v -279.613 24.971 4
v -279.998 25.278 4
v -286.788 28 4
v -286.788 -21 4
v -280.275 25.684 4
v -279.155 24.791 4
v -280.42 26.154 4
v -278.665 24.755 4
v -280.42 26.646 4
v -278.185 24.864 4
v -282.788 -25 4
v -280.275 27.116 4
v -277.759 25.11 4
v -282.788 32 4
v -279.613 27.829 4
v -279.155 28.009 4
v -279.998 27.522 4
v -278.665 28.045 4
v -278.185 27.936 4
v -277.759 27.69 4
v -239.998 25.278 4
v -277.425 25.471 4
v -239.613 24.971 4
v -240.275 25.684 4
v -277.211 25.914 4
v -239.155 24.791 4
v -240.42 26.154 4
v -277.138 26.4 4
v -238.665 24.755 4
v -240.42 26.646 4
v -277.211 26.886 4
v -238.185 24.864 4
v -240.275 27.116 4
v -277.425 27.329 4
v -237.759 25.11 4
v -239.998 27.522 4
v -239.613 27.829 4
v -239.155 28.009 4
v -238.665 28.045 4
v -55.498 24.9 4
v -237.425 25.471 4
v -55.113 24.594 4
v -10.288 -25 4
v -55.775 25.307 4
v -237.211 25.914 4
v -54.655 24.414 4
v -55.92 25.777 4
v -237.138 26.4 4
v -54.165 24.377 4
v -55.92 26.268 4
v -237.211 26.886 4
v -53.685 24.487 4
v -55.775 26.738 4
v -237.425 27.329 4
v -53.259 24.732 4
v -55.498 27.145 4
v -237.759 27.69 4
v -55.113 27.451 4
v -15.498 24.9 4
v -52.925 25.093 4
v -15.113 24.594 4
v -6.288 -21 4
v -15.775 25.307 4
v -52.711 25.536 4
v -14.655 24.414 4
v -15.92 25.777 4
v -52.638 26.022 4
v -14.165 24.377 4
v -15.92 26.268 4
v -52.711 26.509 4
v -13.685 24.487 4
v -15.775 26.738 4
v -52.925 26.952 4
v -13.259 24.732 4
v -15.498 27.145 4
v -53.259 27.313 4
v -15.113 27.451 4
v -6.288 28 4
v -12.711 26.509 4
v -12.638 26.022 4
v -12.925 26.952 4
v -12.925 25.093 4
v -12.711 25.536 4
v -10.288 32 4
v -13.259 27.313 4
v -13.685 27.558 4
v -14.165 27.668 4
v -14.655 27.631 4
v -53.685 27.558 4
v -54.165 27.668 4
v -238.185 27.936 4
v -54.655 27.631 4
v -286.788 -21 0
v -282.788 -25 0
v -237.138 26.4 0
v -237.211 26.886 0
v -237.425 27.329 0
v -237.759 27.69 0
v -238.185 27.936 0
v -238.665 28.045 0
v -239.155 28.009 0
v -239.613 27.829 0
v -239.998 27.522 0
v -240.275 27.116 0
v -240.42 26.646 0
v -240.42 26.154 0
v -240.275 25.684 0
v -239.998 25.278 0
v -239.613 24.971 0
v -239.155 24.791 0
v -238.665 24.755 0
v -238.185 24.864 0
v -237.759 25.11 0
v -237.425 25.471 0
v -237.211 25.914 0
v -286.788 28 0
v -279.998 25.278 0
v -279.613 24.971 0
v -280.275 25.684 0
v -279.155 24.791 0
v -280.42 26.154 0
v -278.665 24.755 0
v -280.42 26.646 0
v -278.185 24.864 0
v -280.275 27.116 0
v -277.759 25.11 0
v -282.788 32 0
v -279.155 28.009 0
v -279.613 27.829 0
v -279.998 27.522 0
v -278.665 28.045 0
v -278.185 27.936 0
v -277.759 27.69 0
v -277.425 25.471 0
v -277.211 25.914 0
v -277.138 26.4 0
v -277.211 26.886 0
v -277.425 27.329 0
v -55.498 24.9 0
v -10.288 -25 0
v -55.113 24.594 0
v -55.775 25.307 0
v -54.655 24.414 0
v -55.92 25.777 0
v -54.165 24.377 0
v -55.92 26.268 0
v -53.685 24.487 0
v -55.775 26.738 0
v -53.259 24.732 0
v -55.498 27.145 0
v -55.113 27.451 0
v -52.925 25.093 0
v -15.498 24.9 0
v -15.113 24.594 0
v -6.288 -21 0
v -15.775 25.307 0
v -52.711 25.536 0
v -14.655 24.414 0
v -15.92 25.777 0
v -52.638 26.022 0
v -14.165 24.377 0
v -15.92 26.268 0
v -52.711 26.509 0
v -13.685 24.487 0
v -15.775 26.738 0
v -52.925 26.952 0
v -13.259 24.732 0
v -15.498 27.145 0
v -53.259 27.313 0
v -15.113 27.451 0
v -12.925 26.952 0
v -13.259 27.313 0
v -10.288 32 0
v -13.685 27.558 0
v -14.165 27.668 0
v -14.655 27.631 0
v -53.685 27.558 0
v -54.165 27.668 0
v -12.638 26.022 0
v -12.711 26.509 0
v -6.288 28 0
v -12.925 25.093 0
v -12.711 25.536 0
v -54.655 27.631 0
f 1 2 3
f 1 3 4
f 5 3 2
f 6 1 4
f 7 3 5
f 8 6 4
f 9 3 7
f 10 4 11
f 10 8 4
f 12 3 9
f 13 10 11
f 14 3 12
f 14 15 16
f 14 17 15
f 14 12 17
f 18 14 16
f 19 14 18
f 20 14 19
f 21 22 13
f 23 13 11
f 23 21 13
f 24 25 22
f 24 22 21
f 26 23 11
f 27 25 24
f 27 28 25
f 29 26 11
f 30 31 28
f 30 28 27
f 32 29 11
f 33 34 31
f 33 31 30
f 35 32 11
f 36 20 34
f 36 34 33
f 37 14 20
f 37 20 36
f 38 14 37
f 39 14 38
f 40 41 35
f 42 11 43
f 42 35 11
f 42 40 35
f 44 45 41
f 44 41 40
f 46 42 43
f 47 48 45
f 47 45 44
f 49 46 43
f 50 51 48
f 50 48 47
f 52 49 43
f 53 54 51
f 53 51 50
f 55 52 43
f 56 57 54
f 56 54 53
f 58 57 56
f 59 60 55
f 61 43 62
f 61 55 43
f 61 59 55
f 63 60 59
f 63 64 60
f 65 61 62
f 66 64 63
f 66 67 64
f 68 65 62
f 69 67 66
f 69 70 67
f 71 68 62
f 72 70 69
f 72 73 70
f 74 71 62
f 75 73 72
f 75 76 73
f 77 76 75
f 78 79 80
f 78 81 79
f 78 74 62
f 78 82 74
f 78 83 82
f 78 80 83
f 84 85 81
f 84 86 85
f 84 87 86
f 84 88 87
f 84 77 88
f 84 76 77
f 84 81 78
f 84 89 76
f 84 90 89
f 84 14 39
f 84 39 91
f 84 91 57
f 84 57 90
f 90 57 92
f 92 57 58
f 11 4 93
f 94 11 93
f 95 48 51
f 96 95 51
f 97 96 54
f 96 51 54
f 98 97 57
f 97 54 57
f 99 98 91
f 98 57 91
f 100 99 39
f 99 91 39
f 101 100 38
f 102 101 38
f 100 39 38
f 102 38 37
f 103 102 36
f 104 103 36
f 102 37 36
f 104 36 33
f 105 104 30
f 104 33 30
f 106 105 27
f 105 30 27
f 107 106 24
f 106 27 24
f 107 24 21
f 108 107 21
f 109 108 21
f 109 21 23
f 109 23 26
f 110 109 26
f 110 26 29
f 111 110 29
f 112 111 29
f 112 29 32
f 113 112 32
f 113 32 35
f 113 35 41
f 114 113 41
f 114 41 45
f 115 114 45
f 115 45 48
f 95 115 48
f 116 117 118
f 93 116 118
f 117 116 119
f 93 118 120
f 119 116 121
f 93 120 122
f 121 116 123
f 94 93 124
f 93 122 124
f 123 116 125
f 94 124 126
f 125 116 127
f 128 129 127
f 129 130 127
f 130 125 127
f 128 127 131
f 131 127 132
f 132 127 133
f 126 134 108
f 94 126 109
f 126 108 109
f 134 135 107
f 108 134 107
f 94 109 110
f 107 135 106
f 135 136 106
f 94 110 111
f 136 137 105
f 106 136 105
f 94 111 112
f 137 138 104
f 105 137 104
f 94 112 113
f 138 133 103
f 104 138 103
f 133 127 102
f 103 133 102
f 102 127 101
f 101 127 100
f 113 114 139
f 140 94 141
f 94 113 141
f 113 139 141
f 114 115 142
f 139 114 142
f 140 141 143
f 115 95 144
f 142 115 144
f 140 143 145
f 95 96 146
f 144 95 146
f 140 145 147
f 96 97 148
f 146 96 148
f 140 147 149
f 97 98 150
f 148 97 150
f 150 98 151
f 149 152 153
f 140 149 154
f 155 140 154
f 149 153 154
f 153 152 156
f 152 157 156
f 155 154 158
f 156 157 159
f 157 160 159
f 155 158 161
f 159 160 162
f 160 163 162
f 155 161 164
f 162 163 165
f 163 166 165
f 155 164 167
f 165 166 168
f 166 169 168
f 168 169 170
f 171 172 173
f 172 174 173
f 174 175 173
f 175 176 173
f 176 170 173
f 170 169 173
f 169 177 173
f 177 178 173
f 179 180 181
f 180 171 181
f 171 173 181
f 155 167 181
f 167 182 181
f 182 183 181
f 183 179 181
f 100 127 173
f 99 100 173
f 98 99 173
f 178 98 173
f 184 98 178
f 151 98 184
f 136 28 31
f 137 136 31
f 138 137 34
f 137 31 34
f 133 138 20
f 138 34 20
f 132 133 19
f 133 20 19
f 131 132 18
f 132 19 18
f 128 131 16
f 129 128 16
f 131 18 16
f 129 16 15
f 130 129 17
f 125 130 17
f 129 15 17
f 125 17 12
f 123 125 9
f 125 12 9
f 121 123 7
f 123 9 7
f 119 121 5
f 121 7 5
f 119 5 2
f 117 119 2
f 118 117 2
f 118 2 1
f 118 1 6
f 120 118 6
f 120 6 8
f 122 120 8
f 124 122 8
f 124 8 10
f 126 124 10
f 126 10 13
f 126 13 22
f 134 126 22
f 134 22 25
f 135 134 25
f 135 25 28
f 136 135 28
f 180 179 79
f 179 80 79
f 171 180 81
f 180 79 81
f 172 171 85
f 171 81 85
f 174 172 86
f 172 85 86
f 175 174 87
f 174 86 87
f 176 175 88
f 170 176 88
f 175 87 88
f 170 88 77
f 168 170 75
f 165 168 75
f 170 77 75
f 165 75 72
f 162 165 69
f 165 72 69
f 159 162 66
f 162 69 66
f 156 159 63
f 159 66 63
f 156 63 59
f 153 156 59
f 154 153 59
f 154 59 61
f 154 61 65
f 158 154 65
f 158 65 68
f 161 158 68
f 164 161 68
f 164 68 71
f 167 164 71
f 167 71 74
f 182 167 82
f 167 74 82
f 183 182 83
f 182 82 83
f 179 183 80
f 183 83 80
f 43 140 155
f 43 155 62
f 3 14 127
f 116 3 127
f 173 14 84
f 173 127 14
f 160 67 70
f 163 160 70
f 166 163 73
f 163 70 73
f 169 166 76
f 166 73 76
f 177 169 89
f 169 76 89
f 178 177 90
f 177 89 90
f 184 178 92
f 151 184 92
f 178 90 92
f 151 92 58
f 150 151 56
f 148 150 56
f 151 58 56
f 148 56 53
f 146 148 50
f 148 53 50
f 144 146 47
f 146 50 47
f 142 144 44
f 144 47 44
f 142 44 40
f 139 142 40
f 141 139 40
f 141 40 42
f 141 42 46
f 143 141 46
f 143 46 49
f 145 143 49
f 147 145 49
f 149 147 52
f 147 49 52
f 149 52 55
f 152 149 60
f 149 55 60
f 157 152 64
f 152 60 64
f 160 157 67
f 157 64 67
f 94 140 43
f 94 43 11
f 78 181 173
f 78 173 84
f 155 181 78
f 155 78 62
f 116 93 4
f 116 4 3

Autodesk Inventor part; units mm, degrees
ref_plane "YZ Plane" through (0, 0, 0) normal (1, 0, 0) x (0, 1, 0)
ref_plane "XZ Plane" through (0, 0, 0) normal (0, 1, 0) x (-1, 0, 0)
ref_plane "XY Plane" through (0, 0, 0) normal (0, 0, 1) x (1, 0, 0)
sketch "Эскиз1" plane through (0, 0, 0) normal (0, 0, 1) x (1, 0, 0)
  line L0 (-286.7881, 32) -> (-6.2881, 32)
  line L1 (-6.2881, 32) -> (-6.2881, -25)
  line L2 (-6.2881, -25) -> (-286.7881, -25)
  line L3 (-286.7881, -25) -> (-286.7881, 32)
  line L4 (-286.7881, 32) -> (-6.2881, -25) construction
  line L5 (-6.2881, 32) -> (-286.7881, -25) construction
  point P0 (0, 0)
  point P1 (-146.5381, 3.5)
  dimension "d0" = 280.5
  dimension "d1" = 57
extrude "Выдавливание1" add sketch "Эскиз1" along normal blind 4
sketch "Эскиз2" plane through (0, 0, 4) normal (0, 0, 1) x (1, 0, 0)
  circle A0 centre (-54.2881, 26.0225) radius 2.1 construction
  circle A1 centre (-14.2881, 26.0225) radius 2.1 construction
  circle A2 centre (-278.7881, 26.4) radius 2.1 construction
  circle A3 centre (-238.7881, 26.4) radius 2.1 construction
  circle A4 centre (-14.2881, 26.0225) radius 1.65
  circle A5 centre (-54.2881, 26.0225) radius 1.65
  circle A6 centre (-238.7881, 26.4) radius 1.65
  circle A7 centre (-278.7881, 26.4) radius 1.65
  point P0 (0, 0)
  dimension "d4" = 3.3
  dimension "d5" = 3.3
  dimension "d6" = 3.3
  dimension "d7" = 3.3
extrude "Выдавливание2" cut sketch "Эскиз2" against normal blind 4
chamfer "Фаска1" distance 4 angle 45 4 edges at (-286.7881, 32, 2) (-286.7881, -25, 2) (-6.2881, -25, 2) (-6.2881, 32, 2)
properties part number "фанера_для_электр"
